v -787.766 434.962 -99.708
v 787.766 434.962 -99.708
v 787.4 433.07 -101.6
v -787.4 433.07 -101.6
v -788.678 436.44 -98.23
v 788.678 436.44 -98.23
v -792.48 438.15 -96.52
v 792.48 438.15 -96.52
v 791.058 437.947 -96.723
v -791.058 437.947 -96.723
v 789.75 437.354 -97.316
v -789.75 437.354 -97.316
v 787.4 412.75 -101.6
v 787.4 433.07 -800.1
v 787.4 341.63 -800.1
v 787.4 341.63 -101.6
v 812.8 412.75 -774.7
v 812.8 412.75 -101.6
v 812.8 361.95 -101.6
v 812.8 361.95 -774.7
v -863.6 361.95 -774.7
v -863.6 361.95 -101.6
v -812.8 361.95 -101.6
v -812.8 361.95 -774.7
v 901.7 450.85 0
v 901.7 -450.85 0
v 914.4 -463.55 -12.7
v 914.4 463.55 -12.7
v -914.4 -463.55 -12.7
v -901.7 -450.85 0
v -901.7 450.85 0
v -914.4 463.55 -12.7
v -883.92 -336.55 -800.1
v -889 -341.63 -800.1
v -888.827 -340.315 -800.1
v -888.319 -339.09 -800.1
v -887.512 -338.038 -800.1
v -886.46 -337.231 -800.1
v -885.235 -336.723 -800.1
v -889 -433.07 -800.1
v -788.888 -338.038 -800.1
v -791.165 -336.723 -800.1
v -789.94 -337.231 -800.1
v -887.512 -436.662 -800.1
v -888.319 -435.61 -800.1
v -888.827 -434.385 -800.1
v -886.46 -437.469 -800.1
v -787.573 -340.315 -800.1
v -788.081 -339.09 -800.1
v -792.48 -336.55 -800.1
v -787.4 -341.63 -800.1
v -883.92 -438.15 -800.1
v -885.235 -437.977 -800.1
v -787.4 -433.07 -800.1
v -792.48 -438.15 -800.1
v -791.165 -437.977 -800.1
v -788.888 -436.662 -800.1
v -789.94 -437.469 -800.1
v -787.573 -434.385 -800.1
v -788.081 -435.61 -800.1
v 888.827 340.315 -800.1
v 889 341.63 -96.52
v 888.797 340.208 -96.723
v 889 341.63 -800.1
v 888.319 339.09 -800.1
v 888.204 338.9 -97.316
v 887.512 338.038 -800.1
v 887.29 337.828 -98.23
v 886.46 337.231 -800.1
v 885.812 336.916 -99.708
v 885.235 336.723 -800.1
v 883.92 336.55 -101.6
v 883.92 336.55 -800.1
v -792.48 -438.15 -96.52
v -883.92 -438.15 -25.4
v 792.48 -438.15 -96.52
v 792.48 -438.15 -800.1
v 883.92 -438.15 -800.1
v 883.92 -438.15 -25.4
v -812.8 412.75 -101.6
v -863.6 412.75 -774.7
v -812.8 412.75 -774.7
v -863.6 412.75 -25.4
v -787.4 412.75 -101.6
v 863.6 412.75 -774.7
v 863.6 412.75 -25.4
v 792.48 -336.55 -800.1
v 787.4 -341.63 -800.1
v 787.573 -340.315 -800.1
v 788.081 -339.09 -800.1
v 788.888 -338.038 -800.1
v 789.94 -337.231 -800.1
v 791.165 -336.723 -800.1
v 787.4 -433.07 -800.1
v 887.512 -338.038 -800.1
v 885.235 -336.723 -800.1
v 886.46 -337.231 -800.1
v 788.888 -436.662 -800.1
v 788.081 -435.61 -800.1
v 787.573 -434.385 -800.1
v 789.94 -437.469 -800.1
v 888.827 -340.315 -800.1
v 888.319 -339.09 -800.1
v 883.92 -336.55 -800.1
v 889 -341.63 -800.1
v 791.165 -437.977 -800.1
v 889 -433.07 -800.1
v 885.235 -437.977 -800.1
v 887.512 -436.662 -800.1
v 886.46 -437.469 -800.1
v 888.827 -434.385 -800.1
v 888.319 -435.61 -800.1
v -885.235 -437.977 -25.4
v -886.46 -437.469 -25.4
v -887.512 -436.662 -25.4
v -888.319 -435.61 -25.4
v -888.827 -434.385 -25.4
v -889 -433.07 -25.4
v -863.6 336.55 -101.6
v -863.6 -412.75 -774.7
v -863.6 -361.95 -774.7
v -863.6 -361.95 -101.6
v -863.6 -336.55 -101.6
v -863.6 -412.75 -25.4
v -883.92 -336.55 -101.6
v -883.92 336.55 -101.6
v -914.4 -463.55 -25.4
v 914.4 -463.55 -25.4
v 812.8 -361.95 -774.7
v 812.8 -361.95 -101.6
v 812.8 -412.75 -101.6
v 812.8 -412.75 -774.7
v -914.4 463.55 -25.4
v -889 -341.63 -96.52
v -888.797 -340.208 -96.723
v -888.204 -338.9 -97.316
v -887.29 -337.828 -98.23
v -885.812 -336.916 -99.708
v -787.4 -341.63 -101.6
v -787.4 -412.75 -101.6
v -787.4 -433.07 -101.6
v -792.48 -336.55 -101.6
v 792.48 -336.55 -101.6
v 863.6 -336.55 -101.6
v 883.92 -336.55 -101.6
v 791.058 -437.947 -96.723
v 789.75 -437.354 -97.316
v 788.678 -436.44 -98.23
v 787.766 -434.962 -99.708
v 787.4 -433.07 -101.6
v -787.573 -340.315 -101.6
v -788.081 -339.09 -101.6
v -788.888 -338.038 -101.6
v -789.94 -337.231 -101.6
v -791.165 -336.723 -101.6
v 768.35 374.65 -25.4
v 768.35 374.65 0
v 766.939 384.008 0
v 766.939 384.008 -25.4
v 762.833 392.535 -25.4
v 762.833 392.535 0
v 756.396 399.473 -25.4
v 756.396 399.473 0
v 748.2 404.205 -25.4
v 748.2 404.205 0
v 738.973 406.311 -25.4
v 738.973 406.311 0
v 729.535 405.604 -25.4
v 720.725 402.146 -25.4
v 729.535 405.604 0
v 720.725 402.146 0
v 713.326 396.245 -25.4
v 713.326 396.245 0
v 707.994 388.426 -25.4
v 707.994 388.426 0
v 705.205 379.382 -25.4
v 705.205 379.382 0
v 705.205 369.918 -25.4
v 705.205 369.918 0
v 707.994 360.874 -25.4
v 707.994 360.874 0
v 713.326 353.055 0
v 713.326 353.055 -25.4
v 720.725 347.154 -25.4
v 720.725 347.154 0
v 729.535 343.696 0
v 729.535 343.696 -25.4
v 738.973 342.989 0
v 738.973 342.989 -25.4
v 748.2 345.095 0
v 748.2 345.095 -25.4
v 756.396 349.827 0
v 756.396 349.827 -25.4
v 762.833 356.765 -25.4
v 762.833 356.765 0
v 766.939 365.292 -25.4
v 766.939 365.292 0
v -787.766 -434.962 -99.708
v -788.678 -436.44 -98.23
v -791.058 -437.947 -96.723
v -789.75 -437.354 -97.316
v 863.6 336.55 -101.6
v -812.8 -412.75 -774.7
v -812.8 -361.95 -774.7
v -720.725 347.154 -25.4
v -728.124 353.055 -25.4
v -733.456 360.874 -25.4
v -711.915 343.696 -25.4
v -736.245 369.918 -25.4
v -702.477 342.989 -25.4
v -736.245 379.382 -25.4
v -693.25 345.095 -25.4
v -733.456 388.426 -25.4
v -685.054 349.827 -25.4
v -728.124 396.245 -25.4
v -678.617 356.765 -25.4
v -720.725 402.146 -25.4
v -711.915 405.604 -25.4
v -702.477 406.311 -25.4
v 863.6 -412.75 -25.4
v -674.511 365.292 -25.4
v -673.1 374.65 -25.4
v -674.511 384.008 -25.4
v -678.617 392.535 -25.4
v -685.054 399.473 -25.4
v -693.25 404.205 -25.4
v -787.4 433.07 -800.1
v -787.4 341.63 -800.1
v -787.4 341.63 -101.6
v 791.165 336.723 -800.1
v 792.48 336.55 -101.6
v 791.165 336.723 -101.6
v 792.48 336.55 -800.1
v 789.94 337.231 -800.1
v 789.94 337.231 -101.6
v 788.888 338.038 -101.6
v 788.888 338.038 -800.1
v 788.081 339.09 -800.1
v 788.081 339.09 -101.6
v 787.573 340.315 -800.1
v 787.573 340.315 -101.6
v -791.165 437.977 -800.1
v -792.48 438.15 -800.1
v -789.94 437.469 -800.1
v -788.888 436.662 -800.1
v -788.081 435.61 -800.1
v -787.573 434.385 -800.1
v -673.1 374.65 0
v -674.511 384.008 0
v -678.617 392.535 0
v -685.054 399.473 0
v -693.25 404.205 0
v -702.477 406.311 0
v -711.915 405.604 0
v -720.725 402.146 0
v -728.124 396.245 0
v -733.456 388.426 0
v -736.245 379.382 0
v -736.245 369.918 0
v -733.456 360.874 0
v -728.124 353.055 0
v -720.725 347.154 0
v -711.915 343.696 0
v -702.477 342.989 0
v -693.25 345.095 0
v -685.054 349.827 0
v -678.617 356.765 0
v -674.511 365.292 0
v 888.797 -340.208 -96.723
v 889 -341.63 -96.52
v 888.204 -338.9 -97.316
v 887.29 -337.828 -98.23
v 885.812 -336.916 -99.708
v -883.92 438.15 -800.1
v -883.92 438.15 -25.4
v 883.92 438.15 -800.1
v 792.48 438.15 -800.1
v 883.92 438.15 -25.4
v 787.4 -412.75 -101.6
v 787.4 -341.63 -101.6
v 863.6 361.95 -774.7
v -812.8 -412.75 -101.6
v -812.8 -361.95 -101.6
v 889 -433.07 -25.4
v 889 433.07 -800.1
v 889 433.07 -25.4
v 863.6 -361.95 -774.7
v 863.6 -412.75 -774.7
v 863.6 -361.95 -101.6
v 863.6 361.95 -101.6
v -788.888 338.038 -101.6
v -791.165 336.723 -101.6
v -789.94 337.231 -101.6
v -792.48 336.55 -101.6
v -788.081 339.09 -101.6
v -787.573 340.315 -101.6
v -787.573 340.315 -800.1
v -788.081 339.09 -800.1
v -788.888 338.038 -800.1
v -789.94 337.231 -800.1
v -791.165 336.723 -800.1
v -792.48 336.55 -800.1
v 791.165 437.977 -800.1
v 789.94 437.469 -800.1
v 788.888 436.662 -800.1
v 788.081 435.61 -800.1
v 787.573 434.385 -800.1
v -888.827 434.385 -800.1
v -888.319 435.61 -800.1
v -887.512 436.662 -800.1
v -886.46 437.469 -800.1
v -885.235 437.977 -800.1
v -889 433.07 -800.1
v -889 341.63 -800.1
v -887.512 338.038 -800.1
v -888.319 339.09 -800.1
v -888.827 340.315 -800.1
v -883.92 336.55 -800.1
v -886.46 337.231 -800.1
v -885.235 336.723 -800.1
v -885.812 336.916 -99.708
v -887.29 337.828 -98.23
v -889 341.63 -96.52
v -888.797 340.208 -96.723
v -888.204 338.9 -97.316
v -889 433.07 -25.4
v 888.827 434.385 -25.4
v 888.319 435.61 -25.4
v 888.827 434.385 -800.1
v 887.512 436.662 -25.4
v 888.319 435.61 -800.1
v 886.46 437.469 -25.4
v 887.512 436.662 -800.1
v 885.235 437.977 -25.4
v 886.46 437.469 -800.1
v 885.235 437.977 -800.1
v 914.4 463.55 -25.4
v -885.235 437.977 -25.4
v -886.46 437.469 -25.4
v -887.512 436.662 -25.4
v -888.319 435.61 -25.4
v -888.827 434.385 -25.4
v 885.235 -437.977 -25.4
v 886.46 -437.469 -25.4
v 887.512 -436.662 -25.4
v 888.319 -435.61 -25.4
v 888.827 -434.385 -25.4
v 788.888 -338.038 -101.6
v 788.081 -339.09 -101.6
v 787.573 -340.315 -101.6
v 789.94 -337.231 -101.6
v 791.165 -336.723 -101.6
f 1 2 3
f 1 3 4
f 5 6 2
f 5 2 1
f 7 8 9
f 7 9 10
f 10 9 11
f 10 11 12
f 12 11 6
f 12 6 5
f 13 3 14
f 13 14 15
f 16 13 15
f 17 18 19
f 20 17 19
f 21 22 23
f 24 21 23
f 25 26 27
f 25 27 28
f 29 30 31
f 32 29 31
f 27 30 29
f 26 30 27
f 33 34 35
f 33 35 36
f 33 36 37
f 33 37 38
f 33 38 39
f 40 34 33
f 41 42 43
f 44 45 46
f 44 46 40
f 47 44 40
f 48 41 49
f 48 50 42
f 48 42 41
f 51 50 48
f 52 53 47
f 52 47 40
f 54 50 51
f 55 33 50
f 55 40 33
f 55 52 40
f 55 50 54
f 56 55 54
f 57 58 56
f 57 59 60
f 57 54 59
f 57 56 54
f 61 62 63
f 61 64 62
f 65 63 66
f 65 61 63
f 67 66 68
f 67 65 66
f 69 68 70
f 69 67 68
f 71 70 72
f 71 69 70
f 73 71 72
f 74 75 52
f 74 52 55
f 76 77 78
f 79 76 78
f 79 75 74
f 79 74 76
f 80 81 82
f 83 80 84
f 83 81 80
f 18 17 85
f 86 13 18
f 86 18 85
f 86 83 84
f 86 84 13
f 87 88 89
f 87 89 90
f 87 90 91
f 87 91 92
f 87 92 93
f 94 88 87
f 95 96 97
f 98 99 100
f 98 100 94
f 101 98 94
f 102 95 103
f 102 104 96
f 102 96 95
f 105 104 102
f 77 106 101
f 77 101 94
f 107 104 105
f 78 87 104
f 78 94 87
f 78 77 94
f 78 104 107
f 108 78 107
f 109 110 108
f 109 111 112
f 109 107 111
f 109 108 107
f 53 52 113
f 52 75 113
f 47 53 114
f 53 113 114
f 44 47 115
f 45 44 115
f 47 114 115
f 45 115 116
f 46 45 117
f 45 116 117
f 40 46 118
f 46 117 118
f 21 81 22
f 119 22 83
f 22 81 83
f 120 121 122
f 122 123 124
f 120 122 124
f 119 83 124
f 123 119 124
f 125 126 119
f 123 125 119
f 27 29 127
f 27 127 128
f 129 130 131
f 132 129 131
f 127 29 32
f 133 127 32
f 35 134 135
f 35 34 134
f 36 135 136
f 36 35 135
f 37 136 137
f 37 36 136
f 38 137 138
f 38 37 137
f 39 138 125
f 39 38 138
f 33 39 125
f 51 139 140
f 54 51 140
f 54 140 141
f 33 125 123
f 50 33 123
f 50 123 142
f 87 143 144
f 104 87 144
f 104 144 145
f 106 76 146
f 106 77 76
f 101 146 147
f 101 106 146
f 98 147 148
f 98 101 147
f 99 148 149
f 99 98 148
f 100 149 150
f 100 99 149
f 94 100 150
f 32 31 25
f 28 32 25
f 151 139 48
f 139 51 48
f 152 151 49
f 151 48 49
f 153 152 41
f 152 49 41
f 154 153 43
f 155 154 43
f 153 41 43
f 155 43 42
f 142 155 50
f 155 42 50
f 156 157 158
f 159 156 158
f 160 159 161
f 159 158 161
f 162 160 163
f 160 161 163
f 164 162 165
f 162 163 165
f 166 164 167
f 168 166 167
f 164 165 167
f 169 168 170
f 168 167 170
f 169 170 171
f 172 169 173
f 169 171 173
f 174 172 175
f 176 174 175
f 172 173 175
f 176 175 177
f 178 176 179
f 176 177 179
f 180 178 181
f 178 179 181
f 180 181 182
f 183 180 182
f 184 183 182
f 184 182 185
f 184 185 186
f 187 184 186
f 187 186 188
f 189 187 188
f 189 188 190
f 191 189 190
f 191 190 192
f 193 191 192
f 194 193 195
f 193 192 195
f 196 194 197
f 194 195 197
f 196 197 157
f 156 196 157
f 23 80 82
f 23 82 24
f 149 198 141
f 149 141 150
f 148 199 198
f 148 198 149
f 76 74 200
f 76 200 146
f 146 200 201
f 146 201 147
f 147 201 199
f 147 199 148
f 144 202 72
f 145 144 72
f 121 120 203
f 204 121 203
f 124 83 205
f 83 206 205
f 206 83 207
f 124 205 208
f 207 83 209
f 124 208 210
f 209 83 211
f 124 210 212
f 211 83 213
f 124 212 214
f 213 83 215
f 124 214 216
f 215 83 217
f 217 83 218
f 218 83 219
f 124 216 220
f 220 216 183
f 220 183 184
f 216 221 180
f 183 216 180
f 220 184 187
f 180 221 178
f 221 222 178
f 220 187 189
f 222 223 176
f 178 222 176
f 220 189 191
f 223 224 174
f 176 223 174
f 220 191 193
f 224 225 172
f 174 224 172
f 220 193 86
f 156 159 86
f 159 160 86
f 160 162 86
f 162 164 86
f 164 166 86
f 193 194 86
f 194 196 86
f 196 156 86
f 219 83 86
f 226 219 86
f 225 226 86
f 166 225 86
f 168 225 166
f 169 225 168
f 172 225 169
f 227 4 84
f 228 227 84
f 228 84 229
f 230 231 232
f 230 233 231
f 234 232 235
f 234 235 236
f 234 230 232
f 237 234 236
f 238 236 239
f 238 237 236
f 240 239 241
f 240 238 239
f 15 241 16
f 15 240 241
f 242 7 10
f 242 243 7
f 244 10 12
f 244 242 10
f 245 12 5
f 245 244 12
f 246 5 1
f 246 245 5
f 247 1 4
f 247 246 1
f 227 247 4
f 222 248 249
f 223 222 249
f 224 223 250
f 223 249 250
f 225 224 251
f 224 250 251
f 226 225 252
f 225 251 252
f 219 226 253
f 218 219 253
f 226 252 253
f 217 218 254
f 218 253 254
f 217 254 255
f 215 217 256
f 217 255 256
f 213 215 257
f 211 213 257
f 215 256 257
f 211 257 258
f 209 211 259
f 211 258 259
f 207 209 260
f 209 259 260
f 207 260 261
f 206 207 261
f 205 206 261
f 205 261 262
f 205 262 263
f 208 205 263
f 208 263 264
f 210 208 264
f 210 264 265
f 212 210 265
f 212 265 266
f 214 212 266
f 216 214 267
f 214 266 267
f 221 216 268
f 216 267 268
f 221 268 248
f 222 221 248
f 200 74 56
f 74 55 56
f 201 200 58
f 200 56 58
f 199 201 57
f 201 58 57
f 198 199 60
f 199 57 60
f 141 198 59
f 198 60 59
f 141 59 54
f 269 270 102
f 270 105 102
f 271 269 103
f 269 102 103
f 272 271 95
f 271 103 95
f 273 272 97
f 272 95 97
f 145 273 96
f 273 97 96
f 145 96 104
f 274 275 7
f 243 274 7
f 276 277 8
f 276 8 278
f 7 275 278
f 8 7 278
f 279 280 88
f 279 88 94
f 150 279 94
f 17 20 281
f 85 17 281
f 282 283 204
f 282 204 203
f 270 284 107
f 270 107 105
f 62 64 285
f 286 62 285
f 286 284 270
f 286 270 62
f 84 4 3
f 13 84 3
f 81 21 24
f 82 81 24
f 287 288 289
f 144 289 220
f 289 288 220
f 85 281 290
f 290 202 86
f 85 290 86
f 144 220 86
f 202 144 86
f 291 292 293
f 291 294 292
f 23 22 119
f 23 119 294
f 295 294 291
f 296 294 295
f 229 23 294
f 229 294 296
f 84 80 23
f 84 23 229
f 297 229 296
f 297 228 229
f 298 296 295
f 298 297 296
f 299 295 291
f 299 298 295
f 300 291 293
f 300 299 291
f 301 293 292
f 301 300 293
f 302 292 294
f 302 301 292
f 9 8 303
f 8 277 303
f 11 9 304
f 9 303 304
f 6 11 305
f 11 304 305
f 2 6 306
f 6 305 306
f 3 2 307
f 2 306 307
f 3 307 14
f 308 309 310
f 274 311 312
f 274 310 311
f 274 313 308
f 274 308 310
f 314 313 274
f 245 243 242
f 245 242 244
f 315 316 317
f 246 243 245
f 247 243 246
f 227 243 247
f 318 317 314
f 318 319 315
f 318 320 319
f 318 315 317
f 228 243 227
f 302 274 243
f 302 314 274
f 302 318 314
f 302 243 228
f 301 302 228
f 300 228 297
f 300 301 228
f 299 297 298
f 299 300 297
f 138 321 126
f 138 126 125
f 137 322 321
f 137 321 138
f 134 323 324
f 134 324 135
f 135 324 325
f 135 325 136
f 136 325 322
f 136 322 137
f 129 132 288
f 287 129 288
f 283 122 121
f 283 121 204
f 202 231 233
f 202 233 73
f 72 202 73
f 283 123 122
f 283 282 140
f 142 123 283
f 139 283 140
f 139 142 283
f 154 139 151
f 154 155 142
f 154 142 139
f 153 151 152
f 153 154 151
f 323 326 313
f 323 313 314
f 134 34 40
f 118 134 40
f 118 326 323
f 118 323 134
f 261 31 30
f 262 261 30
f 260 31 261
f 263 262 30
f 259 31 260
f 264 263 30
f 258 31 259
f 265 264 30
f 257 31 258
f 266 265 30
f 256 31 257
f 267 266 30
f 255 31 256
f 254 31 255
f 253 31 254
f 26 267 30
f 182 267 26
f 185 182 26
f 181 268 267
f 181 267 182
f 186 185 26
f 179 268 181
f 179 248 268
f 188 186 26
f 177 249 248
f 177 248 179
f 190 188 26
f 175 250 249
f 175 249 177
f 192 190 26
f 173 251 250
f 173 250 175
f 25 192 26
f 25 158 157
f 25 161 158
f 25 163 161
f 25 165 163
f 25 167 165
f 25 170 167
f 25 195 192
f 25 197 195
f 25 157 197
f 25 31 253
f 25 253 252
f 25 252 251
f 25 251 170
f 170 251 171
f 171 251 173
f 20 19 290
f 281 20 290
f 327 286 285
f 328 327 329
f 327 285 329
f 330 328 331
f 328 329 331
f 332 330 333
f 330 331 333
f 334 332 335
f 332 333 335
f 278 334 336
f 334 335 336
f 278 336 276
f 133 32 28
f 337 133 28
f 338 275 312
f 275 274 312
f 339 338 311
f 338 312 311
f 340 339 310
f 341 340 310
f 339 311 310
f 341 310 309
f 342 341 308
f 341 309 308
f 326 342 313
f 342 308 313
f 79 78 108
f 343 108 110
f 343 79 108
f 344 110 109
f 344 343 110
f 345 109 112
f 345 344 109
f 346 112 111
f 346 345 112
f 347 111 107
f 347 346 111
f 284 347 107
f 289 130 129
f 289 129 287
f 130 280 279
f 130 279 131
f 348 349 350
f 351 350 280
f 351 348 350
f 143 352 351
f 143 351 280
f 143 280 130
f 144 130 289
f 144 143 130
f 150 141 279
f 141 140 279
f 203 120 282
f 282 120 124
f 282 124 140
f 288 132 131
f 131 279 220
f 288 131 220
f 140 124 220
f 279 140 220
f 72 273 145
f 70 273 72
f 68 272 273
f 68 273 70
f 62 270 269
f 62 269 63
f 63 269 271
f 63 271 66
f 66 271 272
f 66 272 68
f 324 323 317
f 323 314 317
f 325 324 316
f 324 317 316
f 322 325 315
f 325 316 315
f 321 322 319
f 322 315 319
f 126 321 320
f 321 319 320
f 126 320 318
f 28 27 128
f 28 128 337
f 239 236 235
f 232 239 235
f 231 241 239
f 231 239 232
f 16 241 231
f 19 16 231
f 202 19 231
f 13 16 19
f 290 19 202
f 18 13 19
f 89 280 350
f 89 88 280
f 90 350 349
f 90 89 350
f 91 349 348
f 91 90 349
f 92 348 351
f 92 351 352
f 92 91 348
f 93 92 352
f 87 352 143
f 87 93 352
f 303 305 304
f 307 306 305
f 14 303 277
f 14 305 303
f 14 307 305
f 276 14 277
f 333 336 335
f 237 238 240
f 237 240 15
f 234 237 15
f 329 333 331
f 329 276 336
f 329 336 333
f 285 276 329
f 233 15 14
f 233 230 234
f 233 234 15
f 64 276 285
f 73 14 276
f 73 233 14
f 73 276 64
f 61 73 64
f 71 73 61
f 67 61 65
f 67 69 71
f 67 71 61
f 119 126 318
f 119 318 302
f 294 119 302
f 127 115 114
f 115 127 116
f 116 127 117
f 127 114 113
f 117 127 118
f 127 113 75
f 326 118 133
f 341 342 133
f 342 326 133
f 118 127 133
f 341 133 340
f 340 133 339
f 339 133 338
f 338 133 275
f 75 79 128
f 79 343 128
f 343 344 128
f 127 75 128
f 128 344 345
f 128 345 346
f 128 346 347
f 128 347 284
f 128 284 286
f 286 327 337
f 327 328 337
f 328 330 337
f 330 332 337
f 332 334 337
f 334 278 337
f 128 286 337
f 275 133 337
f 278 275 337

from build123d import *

# Parameters (mm, degrees)
F1_W        = 1828.8
F1_H        = 927.1
F2_DEPTH    = 25.4
F0_W        = 1778
F0_H        = 876.3
F3_DEPTH    = 101.6
F4_W        = 101.6
F4_H        = 101.6
F5_DEPTH    = 698.5
F6_T        = 25.4
F6_T3_DEPTH = 927.1
F6_T5_DEPTH = 1828.8
F7_R        = 31.75
F8_DEPTH    = 25.4
F9_SIZE     = 12.7
F10_R       = 5.08
F11_SIZE    = 5.08


# Not quite as in the source:
# - a shell that OpenCascade refuses in one call is made with other operations: the cavity is built on its own and cut out


with BuildPart() as f2:
    # F1 (on Top) → F2 (new body)
    with BuildSketch(Plane.XY):
        Rectangle(F1_W, F1_H)
    extrude(amount=-F2_DEPTH)

    # F0 (on Top) → F3 (join)
    with BuildSketch(Plane.XY):
        Rectangle(F0_W, F0_H)
    extrude(amount=-F3_DEPTH)

    # F4 (on face) → F5 (join)
    with BuildSketch(Plane(origin=(0, 0, -101.6), x_dir=(1, 0, 0), z_dir=(0, 0, -1))):
        with Locations((-838.2, 387.35)):
            Rectangle(F4_W, F4_H)
        with Locations((-838.2, -387.35)):
            Rectangle(F4_W, F4_H)
        with Locations((838.2, 387.35)):
            Rectangle(F4_W, F4_H)
        with Locations((838.2, -387.35)):
            Rectangle(F4_W, F4_H)
    extrude(amount=F5_DEPTH)

    # F6: shell of thickness 25.4, made by hand


with BuildPart() as f6_core1:
    # F6_t2: copy of F2
    add(f2.part)

    # the walls: a layer under each face that stays
    f6_faces = [f6_core1.faces().sort_by_distance(p)[0] for p in [
        (0, 463.55, -12.7),
        (628.65, -452.1043209877, -25.4),
        (762, 438.15, -80.7357142857),
        (-838.2, 387.35, -800.1),
        (-838.2, 336.55, -450.85),
        (-787.4, 387.35, -450.85),
        (-838.2, -336.55, -450.85),
        (-838.2, -387.35, -800.1),
        (-787.4, -387.35, -450.85),
        (787.4, -387.35, -450.85),
        (838.2, -387.35, -800.1),
        (838.2, -336.55, -450.85),
        (838.2, 336.55, -450.85),
        (787.4, 387.35, -450.85),
        (838.2, 387.35, -800.1),
        (889, -375.5571428571, -744.7642857143),
        (-762, -438.15, -80.7357142857),
        (-889, 375.5571428571, -744.7642857143),
        (0, -463.55, -12.7),
        (0, 0, 0),
        (-914.4, 0, -12.7),
        (914.4, 0, -12.7),
    ]]
    thicken(f6_faces, amount=-F6_T, mode=Mode.SUBTRACT)

    # F6_s4 → F6_t3 (cut)
    with BuildSketch(Plane.XZ.offset(-463.55)):
        Polygon((-889.254, -25.654), (-889, 0), (-863.6, 0), (-863.6, -25.4), align=None)
        Polygon((889.254, -25.654), (889, 0), (863.6, 0), (863.6, -25.4), align=None)
    extrude(amount=F6_T3_DEPTH, mode=Mode.SUBTRACT)

    # F6_s6 → F6_t5 (cut)
    with BuildSketch(Plane.YZ.offset(-914.4)):
        Polygon((-438.404, -25.654), (-438.15, 0), (-412.75, 0), (-412.75, -25.4), align=None)
        Polygon((438.404, -25.654), (438.15, 0), (412.75, 0), (412.75, -25.4), align=None)
    extrude(amount=F6_T5_DEPTH, mode=Mode.SUBTRACT)


with BuildPart() as f2_1:
    add(f2.part)

    # what is left inside the walls is the cavity
    f6_cavity = [f6_core1.part.solids().sort_by_distance(p)[0] for p in [
        (0, -137.583333, -25.654),
    ]]
    add(f6_cavity, mode=Mode.SUBTRACT)

    # F7 (on face) → F8 (cut)
    with BuildSketch(Plane.XY):
        with Locations((-704.85, 374.65)):
            Circle(F7_R)
        with Locations((736.6, 374.65)):
            Circle(F7_R)
    extrude(amount=-F8_DEPTH, mode=Mode.SUBTRACT)

    # F9
    f9_edges = [f2_1.edges().sort_by_distance(p)[0] for p in [
        (0, -463.55, 0),
        (-914.4, 0, 0),
        (0, 463.55, 0),
        (914.4, 0, 0),
    ]]
    chamfer(f9_edges, length=F9_SIZE)

    # F10
    f10_edges = [f2_1.edges().sort_by_distance(p)[0] for p in [
        (-889, -438.15, -412.75),
        (-787.4, -438.15, -450.85),
        (-889, -336.55, -450.85),
        (-787.4, -336.55, -450.85),
        (787.4, -438.15, -450.85),
        (889, -438.15, -412.75),
        (787.4, -336.55, -450.85),
        (889, -336.55, -450.85),
        (889, 336.55, -450.85),
        (787.4, 336.55, -450.85),
        (889, 438.15, -412.75),
        (787.4, 438.15, -450.85),
        (-889, 438.15, -412.75),
        (-787.4, 438.15, -450.85),
        (-889, 336.55, -450.85),
        (-787.4, 336.55, -450.85),
    ]]
    fillet(f10_edges, radius=F10_R)

    # F11
    f11_edges = [f2_1.edges().sort_by_distance(p)[0] for p in [
        (-889, 0, -101.6),
        (0, -438.15, -101.6),
        (889, 0, -101.6),
        (0, 438.15, -101.6),
    ]]
    chamfer(f11_edges, length=F11_SIZE)


solid = f2_1.part
